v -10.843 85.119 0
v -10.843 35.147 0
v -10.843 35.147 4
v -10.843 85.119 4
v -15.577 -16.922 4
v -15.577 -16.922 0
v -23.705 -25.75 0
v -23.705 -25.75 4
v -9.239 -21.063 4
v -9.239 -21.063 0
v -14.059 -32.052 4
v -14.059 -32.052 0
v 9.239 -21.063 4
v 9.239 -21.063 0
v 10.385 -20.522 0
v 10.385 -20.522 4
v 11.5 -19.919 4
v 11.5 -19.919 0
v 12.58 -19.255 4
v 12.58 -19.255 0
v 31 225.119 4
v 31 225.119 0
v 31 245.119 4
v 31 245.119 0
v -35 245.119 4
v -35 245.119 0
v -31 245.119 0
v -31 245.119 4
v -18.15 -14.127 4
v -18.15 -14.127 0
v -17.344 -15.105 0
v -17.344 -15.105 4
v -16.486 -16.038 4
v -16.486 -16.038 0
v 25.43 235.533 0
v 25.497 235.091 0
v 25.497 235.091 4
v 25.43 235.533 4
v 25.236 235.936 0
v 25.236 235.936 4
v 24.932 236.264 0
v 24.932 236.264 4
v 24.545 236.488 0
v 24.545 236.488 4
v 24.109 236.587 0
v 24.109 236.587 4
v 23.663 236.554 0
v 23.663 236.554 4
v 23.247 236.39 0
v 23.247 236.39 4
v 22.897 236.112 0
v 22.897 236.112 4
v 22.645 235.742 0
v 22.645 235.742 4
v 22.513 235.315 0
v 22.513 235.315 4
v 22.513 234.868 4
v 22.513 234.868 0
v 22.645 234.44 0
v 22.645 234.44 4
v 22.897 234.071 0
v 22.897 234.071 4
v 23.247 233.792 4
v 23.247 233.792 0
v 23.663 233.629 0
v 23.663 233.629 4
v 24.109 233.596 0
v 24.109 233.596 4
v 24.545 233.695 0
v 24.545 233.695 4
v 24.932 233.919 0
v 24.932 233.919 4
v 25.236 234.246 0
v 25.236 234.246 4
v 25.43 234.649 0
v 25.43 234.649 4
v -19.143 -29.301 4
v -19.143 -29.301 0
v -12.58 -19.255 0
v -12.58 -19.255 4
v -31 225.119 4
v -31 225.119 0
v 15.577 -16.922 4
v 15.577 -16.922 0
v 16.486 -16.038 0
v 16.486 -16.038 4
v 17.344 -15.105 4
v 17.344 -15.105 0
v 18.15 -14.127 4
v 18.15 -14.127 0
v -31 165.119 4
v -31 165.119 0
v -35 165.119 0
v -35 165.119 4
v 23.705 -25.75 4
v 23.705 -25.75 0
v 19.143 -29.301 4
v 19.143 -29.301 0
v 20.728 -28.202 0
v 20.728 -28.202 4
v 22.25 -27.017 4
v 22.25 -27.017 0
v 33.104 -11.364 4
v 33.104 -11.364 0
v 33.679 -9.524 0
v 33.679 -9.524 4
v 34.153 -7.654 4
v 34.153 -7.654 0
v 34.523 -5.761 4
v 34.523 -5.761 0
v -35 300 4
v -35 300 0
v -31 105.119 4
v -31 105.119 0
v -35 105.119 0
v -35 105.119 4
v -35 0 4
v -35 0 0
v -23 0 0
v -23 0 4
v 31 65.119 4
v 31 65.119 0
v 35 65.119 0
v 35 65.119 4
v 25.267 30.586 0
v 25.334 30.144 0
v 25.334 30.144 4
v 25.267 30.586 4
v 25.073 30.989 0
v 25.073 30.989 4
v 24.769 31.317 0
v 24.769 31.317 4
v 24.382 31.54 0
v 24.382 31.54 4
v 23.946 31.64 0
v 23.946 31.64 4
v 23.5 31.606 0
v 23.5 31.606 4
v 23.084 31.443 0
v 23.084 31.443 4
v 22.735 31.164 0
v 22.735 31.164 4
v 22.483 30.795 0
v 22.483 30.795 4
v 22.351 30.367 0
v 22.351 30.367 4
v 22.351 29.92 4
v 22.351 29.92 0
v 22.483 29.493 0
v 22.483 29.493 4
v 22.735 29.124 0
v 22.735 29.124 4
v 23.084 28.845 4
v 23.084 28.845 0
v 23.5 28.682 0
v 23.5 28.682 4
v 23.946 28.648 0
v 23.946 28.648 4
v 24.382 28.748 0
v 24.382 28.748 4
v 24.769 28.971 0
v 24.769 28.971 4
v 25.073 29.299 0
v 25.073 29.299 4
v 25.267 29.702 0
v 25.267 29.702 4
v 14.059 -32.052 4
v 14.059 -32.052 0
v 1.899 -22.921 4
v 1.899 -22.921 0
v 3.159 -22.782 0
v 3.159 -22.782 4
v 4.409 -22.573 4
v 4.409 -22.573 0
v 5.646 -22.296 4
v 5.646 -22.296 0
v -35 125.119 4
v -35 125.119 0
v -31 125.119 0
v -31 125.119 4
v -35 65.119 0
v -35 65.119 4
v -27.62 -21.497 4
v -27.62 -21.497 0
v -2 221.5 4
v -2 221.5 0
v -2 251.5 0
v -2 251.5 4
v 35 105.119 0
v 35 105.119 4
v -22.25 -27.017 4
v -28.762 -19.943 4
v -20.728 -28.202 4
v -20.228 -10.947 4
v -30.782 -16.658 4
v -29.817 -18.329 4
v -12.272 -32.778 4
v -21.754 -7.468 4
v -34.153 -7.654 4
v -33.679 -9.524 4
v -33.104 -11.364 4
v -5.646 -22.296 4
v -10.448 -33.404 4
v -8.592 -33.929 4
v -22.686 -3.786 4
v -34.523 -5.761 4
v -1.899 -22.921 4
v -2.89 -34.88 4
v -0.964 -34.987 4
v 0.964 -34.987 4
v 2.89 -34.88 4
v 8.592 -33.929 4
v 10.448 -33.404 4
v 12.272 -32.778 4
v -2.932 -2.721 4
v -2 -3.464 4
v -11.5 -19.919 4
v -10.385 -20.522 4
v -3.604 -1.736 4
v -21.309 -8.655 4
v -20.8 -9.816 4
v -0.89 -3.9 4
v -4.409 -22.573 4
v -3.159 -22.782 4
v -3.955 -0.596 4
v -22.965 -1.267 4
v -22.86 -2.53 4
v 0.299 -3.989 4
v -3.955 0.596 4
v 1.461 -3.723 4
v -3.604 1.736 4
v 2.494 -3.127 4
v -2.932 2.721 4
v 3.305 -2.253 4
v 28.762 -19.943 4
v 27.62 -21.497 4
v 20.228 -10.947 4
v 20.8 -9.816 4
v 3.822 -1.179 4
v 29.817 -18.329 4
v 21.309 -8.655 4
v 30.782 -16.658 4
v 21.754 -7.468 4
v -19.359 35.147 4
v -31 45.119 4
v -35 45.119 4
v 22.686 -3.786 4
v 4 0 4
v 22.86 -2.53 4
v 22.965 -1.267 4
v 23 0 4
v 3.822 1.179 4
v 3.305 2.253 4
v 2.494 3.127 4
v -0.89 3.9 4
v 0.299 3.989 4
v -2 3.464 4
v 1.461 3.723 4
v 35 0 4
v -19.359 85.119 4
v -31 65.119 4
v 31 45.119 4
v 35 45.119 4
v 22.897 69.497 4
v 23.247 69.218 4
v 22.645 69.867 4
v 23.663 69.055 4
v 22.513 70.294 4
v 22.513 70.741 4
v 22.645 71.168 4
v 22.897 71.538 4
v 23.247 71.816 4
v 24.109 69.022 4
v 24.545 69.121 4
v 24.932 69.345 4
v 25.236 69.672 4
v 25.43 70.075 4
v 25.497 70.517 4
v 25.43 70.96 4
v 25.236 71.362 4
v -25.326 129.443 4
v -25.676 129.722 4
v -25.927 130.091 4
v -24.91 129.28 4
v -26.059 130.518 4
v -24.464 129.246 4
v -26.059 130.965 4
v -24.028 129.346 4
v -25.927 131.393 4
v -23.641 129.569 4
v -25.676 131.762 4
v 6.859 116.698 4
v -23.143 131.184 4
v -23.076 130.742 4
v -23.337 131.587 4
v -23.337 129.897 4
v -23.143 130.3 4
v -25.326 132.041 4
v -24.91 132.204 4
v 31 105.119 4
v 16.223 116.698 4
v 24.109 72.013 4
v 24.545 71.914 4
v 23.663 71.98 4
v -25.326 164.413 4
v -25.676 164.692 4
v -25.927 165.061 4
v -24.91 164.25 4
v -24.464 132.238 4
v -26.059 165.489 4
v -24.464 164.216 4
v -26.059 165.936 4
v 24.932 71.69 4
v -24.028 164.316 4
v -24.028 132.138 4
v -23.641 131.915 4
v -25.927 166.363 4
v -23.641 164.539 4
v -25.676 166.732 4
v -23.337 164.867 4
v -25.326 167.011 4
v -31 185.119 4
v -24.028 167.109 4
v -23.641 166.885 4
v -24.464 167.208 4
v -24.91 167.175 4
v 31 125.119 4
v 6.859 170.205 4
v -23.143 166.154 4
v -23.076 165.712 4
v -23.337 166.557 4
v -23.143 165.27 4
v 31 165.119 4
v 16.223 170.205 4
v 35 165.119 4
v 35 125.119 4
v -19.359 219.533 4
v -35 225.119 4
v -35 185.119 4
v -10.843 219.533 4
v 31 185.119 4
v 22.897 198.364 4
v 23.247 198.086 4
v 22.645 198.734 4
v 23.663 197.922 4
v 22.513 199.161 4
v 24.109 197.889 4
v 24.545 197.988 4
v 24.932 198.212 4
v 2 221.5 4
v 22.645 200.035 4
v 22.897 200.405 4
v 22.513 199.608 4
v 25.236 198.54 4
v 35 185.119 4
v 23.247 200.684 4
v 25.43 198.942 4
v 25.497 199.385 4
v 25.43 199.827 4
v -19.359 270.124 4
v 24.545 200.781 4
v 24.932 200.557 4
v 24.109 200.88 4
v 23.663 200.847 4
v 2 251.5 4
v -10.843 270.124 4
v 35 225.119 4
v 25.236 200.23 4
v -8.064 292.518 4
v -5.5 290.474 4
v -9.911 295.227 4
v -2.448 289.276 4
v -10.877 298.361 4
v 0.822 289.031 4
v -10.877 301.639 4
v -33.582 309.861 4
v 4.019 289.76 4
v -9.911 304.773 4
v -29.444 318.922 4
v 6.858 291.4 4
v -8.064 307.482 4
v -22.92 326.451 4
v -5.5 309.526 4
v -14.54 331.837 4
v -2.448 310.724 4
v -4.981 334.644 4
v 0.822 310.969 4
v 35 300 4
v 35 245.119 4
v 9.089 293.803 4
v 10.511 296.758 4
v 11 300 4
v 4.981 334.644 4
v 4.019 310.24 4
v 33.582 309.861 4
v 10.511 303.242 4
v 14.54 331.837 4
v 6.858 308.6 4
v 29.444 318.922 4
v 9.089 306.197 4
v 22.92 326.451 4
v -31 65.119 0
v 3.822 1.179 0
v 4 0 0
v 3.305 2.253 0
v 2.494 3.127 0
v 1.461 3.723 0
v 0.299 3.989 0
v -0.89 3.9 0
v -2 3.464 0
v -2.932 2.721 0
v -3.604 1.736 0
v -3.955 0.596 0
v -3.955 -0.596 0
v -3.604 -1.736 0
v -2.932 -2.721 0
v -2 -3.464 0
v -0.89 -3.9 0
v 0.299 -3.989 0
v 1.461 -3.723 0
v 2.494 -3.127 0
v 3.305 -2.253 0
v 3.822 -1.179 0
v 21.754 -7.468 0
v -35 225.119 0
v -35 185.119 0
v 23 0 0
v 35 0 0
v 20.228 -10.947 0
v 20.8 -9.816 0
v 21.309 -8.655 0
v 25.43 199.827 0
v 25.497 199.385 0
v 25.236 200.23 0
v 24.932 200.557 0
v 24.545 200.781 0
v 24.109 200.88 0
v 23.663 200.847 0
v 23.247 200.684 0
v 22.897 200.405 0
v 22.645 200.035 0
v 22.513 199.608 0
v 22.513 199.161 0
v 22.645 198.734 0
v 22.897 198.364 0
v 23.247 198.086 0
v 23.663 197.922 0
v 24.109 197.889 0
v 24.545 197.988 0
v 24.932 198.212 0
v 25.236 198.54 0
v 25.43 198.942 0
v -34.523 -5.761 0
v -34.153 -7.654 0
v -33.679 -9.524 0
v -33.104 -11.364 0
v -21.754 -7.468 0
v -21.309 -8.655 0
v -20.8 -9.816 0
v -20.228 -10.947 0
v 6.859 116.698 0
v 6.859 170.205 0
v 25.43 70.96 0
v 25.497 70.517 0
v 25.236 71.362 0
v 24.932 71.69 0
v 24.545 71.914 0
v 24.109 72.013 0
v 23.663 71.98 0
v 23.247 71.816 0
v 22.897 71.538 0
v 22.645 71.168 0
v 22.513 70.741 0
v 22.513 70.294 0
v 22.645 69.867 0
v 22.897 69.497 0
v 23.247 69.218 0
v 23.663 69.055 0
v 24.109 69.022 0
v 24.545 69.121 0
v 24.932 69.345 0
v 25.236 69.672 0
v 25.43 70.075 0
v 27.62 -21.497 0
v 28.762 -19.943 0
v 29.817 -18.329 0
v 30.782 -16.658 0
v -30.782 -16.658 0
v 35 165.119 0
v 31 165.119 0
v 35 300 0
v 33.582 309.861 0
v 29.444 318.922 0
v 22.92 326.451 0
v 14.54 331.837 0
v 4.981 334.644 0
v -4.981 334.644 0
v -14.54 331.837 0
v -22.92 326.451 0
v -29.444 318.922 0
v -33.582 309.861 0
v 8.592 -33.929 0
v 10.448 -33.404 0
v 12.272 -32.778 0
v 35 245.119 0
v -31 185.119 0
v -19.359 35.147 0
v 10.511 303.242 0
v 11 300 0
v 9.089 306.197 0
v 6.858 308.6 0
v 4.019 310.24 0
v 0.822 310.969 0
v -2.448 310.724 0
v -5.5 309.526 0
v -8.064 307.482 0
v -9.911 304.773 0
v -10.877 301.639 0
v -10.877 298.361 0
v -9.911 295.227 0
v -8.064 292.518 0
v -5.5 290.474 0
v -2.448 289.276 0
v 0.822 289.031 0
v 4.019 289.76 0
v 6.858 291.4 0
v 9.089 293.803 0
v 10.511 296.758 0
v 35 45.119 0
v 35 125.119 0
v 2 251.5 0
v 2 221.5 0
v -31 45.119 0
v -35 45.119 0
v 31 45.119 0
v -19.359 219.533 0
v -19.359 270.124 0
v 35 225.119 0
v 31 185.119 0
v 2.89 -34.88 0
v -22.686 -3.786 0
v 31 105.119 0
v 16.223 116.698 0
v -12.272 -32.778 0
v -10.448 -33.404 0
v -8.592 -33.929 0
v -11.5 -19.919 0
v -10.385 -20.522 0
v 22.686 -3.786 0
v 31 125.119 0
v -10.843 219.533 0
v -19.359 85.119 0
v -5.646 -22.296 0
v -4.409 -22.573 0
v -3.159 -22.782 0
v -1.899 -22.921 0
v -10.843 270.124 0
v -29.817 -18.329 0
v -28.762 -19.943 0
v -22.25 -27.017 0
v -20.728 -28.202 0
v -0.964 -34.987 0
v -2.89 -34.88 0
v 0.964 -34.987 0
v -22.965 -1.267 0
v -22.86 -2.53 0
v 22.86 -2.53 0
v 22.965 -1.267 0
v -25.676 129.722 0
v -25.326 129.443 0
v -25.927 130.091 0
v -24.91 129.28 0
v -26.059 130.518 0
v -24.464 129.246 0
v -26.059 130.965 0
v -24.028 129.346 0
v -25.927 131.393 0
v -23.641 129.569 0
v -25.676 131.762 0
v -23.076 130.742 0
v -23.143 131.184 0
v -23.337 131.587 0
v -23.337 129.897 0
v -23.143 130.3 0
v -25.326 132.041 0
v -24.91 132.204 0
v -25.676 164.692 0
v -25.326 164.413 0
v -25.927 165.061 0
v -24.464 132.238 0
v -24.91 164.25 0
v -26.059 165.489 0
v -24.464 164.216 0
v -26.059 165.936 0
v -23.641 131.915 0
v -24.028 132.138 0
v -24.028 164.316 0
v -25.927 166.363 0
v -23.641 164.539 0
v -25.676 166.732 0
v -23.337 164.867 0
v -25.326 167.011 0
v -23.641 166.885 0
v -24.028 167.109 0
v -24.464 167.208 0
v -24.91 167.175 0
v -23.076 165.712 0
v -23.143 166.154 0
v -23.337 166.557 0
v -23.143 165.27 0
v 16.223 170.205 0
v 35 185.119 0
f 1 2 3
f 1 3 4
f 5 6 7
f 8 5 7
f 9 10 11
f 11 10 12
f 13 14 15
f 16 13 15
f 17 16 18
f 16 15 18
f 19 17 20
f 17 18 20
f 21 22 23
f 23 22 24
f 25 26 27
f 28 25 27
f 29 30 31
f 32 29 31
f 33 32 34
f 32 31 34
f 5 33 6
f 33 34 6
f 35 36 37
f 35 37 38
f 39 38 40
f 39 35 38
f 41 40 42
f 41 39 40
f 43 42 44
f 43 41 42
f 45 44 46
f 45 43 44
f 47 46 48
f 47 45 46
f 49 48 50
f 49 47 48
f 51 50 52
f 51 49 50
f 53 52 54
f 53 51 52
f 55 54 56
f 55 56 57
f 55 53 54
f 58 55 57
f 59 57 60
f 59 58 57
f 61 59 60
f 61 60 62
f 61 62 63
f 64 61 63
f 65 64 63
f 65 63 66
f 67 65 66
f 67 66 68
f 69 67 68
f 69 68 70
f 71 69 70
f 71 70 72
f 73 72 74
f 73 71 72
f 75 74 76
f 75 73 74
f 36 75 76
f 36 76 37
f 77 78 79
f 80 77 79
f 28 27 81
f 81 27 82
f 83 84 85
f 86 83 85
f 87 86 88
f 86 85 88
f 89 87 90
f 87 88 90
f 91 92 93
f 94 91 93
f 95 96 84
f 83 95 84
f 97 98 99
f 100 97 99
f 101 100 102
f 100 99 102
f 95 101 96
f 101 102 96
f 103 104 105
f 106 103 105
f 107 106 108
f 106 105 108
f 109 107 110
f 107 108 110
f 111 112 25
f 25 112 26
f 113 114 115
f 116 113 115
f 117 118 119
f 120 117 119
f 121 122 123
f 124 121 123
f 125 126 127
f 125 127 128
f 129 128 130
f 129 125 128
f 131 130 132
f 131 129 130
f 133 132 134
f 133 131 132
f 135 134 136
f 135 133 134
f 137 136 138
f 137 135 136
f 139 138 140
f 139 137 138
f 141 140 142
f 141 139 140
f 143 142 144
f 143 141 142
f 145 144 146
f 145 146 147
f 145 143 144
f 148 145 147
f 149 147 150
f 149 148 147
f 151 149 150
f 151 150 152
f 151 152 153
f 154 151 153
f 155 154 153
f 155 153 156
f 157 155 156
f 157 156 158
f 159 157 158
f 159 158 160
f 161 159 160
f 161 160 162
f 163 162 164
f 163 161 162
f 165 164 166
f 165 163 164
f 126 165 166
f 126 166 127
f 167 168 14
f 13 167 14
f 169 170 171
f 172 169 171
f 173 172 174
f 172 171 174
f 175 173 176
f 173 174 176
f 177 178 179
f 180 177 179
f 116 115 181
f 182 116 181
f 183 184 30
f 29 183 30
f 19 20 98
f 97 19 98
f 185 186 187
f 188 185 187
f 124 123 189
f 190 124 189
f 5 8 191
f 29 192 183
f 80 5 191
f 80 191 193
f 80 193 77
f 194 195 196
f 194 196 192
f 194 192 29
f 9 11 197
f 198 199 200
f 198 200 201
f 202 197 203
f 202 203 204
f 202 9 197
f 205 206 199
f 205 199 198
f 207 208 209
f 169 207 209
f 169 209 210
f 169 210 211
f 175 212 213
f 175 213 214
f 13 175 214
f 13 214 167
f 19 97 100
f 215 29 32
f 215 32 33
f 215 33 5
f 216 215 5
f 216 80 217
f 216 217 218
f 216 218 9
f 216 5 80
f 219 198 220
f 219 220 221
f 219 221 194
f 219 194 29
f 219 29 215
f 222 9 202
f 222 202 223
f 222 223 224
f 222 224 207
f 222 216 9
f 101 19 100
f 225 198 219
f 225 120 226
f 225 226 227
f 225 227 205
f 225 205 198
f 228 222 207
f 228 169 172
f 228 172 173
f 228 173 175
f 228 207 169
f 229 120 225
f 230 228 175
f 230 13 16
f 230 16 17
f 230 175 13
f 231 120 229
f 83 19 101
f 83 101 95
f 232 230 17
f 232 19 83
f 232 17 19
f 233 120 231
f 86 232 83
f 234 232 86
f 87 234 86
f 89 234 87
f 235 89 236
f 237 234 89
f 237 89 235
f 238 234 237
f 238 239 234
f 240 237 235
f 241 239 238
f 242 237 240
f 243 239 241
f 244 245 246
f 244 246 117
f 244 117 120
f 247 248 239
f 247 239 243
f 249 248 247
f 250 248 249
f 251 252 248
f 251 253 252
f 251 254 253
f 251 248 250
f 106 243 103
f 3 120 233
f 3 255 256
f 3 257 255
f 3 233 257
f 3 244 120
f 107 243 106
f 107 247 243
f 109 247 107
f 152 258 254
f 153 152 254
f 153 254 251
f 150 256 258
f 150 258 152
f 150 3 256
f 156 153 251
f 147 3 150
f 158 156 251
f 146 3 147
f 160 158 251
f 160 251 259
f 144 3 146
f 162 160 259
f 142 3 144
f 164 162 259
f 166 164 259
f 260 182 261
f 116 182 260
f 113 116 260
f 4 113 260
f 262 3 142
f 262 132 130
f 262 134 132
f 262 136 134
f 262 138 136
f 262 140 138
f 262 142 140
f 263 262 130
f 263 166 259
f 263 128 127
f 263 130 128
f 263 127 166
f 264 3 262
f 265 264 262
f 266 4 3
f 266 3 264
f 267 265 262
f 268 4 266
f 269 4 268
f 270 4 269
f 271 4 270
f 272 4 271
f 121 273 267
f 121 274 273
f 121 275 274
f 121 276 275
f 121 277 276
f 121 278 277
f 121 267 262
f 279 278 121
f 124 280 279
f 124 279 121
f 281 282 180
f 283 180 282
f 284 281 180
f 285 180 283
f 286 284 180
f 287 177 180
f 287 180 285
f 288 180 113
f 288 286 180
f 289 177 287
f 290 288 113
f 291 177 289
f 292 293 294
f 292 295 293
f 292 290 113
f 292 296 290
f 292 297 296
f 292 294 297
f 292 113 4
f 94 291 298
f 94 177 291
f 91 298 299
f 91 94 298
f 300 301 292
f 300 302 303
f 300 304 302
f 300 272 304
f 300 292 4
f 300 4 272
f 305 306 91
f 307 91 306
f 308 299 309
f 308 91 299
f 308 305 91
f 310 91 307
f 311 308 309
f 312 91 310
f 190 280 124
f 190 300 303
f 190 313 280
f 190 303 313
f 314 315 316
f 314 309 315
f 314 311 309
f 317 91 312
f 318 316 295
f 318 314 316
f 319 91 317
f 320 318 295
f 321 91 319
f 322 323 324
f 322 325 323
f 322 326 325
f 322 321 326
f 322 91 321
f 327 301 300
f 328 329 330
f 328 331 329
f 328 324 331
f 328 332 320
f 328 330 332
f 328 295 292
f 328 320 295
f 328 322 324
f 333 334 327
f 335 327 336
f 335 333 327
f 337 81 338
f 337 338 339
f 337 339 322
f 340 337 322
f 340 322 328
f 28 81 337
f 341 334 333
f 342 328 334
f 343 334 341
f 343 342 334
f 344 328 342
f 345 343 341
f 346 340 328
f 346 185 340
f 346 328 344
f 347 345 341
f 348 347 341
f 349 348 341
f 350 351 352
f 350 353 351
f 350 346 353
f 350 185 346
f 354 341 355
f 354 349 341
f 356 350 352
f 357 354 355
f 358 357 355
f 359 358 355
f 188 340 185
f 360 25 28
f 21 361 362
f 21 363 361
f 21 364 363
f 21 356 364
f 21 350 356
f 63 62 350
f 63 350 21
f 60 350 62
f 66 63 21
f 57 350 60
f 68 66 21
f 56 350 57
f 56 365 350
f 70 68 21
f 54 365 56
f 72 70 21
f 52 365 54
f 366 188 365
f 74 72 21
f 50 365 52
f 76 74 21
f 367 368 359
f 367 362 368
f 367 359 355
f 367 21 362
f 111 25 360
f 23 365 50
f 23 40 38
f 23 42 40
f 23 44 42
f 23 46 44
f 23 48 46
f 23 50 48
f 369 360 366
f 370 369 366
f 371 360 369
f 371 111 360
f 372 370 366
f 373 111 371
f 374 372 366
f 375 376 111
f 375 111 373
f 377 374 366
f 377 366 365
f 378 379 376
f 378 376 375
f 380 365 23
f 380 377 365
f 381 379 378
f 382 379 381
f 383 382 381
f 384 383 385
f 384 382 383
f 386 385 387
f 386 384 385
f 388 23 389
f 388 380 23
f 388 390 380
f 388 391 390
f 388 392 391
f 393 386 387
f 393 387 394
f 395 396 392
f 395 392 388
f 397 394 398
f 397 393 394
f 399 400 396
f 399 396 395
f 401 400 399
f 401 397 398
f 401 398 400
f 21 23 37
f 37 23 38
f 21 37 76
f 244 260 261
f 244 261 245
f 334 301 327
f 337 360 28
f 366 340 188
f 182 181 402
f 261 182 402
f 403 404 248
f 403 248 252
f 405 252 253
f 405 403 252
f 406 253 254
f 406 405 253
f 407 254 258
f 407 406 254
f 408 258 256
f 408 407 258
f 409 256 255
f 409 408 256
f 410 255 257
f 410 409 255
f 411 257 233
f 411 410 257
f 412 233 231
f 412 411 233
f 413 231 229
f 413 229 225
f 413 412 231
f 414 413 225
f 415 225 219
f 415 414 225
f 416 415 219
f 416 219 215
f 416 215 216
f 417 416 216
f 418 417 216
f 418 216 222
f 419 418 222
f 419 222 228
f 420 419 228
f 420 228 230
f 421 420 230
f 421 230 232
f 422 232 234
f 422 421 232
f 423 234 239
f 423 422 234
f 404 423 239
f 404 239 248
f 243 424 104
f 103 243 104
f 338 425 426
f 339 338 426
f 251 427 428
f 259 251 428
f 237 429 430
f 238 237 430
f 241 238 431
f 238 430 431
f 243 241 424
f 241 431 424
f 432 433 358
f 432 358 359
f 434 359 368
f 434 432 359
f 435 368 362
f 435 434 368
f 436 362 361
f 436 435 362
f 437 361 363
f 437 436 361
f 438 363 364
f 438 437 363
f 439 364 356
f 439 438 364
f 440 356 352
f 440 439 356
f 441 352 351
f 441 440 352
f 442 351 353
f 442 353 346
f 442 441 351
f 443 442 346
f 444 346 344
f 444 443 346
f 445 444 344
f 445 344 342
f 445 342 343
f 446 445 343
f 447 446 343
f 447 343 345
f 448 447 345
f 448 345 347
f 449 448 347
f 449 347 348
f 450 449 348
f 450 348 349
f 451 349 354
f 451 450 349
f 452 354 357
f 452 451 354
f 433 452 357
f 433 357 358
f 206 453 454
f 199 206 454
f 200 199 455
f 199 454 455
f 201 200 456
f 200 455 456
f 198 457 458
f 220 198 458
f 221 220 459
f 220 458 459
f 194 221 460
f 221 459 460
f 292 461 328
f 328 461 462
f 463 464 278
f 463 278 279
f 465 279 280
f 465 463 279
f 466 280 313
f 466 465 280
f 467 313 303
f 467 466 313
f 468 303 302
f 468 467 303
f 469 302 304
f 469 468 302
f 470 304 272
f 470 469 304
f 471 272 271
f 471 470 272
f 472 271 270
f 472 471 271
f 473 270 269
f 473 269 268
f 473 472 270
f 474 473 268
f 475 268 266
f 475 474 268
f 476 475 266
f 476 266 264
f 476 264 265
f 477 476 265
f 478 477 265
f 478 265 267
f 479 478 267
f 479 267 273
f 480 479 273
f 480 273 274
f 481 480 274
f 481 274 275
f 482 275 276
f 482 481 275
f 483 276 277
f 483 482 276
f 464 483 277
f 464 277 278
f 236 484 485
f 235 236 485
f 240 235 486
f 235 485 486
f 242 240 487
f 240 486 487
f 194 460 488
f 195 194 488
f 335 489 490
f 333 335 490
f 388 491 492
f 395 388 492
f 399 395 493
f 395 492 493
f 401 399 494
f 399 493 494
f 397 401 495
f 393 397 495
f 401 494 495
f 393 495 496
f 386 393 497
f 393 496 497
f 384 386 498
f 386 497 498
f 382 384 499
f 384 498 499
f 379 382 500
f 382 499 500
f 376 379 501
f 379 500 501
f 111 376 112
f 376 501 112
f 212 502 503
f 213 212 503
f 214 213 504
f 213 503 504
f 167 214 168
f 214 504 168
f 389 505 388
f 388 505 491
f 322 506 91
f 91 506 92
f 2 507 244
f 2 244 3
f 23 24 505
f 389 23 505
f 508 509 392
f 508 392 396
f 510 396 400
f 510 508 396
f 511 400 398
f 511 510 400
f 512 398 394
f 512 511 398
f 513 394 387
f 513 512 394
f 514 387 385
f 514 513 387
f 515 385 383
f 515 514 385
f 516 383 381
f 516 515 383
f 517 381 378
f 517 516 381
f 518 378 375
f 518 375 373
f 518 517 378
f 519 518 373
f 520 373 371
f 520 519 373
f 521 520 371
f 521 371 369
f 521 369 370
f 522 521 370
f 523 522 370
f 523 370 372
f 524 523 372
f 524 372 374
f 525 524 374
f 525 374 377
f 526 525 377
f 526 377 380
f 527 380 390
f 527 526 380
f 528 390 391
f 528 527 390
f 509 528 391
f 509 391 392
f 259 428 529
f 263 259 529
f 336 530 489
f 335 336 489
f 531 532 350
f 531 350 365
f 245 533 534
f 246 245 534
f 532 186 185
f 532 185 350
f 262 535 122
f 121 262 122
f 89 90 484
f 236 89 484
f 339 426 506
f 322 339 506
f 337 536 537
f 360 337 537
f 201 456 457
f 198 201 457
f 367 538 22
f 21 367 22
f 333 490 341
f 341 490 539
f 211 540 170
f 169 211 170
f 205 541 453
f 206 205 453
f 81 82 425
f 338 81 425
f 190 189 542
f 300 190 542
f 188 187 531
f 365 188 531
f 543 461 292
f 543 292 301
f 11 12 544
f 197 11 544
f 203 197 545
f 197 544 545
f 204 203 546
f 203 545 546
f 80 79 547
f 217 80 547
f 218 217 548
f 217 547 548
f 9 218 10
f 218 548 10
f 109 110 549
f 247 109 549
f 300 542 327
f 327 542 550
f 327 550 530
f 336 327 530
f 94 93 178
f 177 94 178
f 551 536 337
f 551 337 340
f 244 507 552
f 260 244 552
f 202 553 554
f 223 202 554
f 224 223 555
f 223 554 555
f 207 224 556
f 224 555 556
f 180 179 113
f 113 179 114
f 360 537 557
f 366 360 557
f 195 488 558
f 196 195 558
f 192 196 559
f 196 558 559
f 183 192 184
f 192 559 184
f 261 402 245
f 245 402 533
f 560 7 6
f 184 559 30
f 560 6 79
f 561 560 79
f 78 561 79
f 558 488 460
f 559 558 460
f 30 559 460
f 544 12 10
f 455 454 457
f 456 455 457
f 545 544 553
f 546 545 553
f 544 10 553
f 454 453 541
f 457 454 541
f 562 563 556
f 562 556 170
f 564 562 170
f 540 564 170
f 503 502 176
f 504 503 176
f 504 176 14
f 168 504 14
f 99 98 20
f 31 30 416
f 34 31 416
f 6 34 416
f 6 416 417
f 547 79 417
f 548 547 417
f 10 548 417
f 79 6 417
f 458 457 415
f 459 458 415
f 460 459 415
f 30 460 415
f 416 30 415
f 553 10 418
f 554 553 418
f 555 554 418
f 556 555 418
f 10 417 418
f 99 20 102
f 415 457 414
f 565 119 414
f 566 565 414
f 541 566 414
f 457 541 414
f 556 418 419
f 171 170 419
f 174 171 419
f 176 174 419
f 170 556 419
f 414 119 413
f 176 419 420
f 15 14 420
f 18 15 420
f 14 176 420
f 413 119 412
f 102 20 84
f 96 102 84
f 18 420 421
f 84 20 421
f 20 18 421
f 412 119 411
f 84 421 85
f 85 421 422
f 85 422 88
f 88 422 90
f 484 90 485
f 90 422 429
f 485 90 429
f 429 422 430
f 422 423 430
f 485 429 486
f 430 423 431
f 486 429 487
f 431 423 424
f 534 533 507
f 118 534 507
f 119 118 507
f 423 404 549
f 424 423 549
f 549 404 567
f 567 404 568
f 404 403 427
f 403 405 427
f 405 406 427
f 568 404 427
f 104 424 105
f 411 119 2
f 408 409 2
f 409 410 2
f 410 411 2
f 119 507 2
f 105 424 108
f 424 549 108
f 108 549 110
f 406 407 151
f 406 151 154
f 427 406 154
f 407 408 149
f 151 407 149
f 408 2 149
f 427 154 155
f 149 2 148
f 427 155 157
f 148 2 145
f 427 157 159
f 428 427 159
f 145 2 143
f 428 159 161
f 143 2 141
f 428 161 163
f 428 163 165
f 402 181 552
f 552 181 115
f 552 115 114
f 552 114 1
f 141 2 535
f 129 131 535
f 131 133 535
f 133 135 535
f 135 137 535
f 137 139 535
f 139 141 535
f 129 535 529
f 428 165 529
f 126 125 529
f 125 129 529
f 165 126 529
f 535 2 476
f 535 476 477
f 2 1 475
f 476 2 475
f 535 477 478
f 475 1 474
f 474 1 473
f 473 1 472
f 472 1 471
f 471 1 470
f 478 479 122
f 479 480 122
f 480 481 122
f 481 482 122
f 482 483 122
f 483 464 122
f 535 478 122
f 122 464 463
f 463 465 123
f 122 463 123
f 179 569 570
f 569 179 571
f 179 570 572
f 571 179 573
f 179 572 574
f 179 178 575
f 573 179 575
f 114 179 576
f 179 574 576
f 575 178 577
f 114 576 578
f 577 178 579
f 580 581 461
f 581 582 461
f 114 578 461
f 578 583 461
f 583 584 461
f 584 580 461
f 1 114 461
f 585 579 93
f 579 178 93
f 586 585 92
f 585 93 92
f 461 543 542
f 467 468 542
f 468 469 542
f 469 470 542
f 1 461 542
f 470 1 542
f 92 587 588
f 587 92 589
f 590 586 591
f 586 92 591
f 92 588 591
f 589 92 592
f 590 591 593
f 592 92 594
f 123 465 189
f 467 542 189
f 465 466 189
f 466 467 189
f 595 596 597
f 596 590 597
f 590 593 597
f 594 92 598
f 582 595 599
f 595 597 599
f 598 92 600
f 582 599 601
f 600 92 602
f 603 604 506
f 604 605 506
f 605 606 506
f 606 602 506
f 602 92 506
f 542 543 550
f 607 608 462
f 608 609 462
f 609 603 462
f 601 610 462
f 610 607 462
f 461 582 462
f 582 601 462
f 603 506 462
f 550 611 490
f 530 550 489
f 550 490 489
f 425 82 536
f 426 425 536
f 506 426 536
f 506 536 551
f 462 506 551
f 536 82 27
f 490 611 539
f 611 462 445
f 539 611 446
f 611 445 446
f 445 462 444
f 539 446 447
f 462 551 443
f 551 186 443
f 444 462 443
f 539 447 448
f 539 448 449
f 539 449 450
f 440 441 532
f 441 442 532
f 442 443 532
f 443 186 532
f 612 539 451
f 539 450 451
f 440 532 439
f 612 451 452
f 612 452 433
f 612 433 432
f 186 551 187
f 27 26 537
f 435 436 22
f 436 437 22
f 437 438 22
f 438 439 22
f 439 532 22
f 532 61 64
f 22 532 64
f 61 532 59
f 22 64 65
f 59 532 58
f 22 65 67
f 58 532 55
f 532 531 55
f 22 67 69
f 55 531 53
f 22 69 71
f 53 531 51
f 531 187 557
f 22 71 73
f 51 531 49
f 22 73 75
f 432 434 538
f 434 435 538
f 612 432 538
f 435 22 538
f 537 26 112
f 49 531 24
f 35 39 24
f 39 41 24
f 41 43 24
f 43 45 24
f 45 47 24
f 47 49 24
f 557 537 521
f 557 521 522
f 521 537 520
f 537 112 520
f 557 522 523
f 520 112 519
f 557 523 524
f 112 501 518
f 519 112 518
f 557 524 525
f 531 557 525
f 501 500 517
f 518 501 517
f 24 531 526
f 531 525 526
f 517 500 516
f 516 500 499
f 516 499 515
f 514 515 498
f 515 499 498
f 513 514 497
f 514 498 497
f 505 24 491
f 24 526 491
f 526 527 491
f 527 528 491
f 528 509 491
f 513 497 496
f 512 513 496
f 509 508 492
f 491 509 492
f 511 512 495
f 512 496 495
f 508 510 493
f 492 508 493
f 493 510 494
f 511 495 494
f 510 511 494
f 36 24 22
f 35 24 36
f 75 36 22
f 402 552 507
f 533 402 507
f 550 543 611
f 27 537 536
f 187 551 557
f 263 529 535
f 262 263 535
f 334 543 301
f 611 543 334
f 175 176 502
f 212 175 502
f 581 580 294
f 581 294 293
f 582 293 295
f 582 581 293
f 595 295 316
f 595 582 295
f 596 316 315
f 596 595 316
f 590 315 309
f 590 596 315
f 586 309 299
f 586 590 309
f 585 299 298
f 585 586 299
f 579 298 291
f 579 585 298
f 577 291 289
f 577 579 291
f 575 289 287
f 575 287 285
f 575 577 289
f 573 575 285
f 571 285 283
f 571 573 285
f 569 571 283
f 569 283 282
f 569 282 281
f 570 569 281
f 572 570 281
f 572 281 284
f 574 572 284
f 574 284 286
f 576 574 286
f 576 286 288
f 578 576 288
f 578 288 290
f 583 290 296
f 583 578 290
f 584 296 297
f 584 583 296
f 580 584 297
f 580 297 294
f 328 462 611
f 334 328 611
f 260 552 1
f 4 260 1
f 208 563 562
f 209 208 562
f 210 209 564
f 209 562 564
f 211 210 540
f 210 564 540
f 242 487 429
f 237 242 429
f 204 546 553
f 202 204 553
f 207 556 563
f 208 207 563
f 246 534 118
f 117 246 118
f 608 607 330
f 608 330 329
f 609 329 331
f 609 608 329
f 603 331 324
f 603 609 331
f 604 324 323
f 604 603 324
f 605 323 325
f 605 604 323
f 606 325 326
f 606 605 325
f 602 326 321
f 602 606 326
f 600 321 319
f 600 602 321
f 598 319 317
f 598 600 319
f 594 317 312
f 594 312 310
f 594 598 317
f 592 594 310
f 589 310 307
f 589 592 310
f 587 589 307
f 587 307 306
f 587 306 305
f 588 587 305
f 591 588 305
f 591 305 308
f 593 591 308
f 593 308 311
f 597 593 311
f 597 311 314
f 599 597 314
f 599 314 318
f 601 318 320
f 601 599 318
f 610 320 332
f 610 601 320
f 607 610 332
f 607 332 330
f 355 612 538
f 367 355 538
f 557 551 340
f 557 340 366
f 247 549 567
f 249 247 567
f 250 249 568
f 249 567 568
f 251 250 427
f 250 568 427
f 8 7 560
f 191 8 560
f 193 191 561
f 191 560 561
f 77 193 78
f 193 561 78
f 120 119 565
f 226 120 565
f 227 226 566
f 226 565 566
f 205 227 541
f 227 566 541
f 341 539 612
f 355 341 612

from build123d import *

# Parameters (mm, degrees)
SKETCH1_R           = 4
SKETCH1_R_2         = 11
SKETCH1_R_3         = 1.5
SKETCH1_W           = 4
SKETCH1_H           = 30
SKETCH1_W_2         = 8.515362535
SKETCH1_H_2         = 50.591793773
SKETCH1_W_3         = 9.363802293
SKETCH1_H_3         = 53.507441676
SKETCH1_H_4         = 49.971994441
BOSS_EXTRUDE1_DEPTH = 4


with BuildPart() as part:
    # Sketch1 → Boss-Extrude1 (new body)
    with BuildSketch(Plane.XY):
        with BuildLine():
            Line((-35, 300), (-35, 245.119310596))
            Line((-35, 245.119310596), (-31, 245.119310596))
            Line((-31, 245.119310596), (-31, 225.119310596))
            Line((-31, 225.119310596), (-35, 225.119310596))
            Line((-35, 225.119310596), (-35, 185.119310596))
            Line((-35, 185.119310596), (-31, 185.119310596))
            Line((-31, 185.119310596), (-31, 165.119310596))
            Line((-31, 165.119310596), (-35, 165.119310596))
            Line((-35, 165.119310596), (-35, 125.119310596))
            Line((-35, 125.119310596), (-31, 125.119310596))
            Line((-31, 125.119310596), (-31, 105.119310596))
            Line((-31, 105.119310596), (-35, 105.119310596))
            Line((-35, 105.119310596), (-35, 65.119310596))
            Line((-35, 65.119310596), (-31, 65.119310596))
            Line((-31, 65.119310596), (-31, 45.119310596))
            Line((-31, 45.119310596), (-35, 45.119310596))
            Line((-35, 45.119310596), (-35, 0))
            Line((-35, 0), (-23, 0))
            ThreePointArc((-23, 0), (-22.921443339, -1.899324946), (-22.686309978, -3.785675576))
            Line((-22.686309978, -3.785675576), (-34.522645619, -5.76081066))
            ThreePointArc((-34.522645619, -5.76081066), (-33.929009308, -8.59199205), (-33.10360346, -11.364481422))
            Line((-33.10360346, -11.364481422), (-21.753796559, -7.468087792))
            ThreePointArc((-21.753796559, -7.468087792), (-21.062786513, -9.238994767), (-20.227896278, -10.94679004))
            Line((-20.227896278, -10.94679004), (-30.781581292, -16.658158756))
            ThreePointArc((-30.781581292, -16.658158756), (-29.300826739, -19.143185534), (-27.619917829, -21.497444944))
            Line((-27.619917829, -21.497444944), (-18.150231716, -14.126892392))
            ThreePointArc((-18.150231716, -14.126892392), (-16.921649945, -15.577476147), (-15.577476147, -16.921649945))
            Line((-15.577476147, -16.921649945), (-23.704855007, -25.750336874))
            ThreePointArc((-23.704855007, -25.750336874), (-21.497444944, -27.619917829), (-19.143185534, -29.300826739))
            Line((-19.143185534, -29.300826739), (-12.579807637, -19.254829))
            ThreePointArc((-12.579807637, -19.254829), (-10.94679004, -20.227896278), (-9.238994767, -21.062786513))
            Line((-9.238994767, -21.062786513), (-14.059339863, -32.052066433))
            ThreePointArc((-14.059339863, -32.052066433), (-11.364481422, -33.10360346), (-8.59199205, -33.929009308))
            Line((-8.59199205, -33.929009308), (-5.646166204, -22.296206117))
            ThreePointArc((-5.646166204, -22.296206117), (-3.785675576, -22.686309978), (-1.899324946, -22.921443339))
            Line((-1.899324946, -22.921443339), (-2.890277092, -34.880457255))
            ThreePointArc((-2.890277092, -34.880457255), (0, -35), (2.890277092, -34.880457255))
            Line((2.890277092, -34.880457255), (1.899324946, -22.921443339))
            ThreePointArc((1.899324946, -22.921443339), (3.785675576, -22.686309978), (5.646166204, -22.296206117))
            Line((5.646166204, -22.296206117), (8.59199205, -33.929009308))
            ThreePointArc((8.59199205, -33.929009308), (11.364481422, -33.10360346), (14.059339863, -32.052066433))
            Line((14.059339863, -32.052066433), (9.238994767, -21.062786513))
            ThreePointArc((9.238994767, -21.062786513), (10.94679004, -20.227896278), (12.579807637, -19.254829))
            Line((12.579807637, -19.254829), (19.143185534, -29.300826739))
            ThreePointArc((19.143185534, -29.300826739), (21.497444944, -27.619917829), (23.704855007, -25.750336874))
            Line((23.704855007, -25.750336874), (15.577476147, -16.921649945))
            ThreePointArc((15.577476147, -16.921649945), (16.921649945, -15.577476147), (18.150231716, -14.126892392))
            Line((18.150231716, -14.126892392), (27.619917829, -21.497444944))
            ThreePointArc((27.619917829, -21.497444944), (29.300826739, -19.143185534), (30.781581292, -16.658158756))
            Line((30.781581292, -16.658158756), (20.227896278, -10.94679004))
            ThreePointArc((20.227896278, -10.94679004), (21.062786513, -9.238994767), (21.753796559, -7.468087792))
            Line((21.753796559, -7.468087792), (33.10360346, -11.364481422))
            ThreePointArc((33.10360346, -11.364481422), (33.929009308, -8.59199205), (34.522645619, -5.76081066))
            Line((34.522645619, -5.76081066), (22.686309978, -3.785675576))
            ThreePointArc((22.686309978, -3.785675576), (22.921443339, -1.899324946), (23, 0))
            Line((23, 0), (35, 0))
            Line((35, 0), (35, 45.119310596))
            Line((35, 45.119310596), (31, 45.119310596))
            Line((31, 45.119310596), (31, 65.119310596))
            Line((31, 65.119310596), (35, 65.119310596))
            Line((35, 65.119310596), (35, 105.119310596))
            Line((35, 105.119310596), (31, 105.119310596))
            Line((31, 105.119310596), (31, 125.119310596))
            Line((31, 125.119310596), (35, 125.119310596))
            Line((35, 125.119310596), (35, 165.119310596))
            Line((35, 165.119310596), (31, 165.119310596))
            Line((31, 165.119310596), (31, 185.119310596))
            Line((31, 185.119310596), (35, 185.119310596))
            Line((35, 185.119310596), (35, 225.119310596))
            Line((35, 225.119310596), (31, 225.119310596))
            Line((31, 225.119310596), (31, 245.119310596))
            Line((31, 245.119310596), (35, 245.119310596))
            Line((35, 245.119310596), (35, 300))
            ThreePointArc((35, 300), (0, 335), (-35, 300))
        make_face()
        Circle(SKETCH1_R, mode=Mode.SUBTRACT)
        with Locations((0, 300)):
            Circle(SKETCH1_R_2, mode=Mode.SUBTRACT)
        with Locations((23.996702537, 235.091311609)):
            Circle(SKETCH1_R_3, mode=Mode.SUBTRACT)
        with Locations((-24.57592592, 165.712200906)):
            Circle(SKETCH1_R_3, mode=Mode.SUBTRACT)
        with Locations((23.996702545, 199.384614522)):
            Circle(SKETCH1_R_3, mode=Mode.SUBTRACT)
        with Locations((-24.57592592, 130.741920595)):
            Circle(SKETCH1_R_3, mode=Mode.SUBTRACT)
        with Locations((23.996702545, 70.517408204)):
            Circle(SKETCH1_R_3, mode=Mode.SUBTRACT)
        with Locations((23.834109516, 30.143932105)):
            Circle(SKETCH1_R_3, mode=Mode.SUBTRACT)
        with Locations((0, 236.5)):
            Rectangle(SKETCH1_W, SKETCH1_H, mode=Mode.SUBTRACT)
        with Locations((-15.100973899, 244.828514205)):
            Rectangle(SKETCH1_W_2, SKETCH1_H_2, mode=Mode.SUBTRACT)
        with Locations((11.541273102, 143.451426266)):
            Rectangle(SKETCH1_W_3, SKETCH1_H_3, mode=Mode.SUBTRACT)
        with Locations((-15.100973899, 60.133313376)):
            Rectangle(SKETCH1_W_2, SKETCH1_H_4, mode=Mode.SUBTRACT)
    extrude(amount=BOSS_EXTRUDE1_DEPTH)


solid = part.part
